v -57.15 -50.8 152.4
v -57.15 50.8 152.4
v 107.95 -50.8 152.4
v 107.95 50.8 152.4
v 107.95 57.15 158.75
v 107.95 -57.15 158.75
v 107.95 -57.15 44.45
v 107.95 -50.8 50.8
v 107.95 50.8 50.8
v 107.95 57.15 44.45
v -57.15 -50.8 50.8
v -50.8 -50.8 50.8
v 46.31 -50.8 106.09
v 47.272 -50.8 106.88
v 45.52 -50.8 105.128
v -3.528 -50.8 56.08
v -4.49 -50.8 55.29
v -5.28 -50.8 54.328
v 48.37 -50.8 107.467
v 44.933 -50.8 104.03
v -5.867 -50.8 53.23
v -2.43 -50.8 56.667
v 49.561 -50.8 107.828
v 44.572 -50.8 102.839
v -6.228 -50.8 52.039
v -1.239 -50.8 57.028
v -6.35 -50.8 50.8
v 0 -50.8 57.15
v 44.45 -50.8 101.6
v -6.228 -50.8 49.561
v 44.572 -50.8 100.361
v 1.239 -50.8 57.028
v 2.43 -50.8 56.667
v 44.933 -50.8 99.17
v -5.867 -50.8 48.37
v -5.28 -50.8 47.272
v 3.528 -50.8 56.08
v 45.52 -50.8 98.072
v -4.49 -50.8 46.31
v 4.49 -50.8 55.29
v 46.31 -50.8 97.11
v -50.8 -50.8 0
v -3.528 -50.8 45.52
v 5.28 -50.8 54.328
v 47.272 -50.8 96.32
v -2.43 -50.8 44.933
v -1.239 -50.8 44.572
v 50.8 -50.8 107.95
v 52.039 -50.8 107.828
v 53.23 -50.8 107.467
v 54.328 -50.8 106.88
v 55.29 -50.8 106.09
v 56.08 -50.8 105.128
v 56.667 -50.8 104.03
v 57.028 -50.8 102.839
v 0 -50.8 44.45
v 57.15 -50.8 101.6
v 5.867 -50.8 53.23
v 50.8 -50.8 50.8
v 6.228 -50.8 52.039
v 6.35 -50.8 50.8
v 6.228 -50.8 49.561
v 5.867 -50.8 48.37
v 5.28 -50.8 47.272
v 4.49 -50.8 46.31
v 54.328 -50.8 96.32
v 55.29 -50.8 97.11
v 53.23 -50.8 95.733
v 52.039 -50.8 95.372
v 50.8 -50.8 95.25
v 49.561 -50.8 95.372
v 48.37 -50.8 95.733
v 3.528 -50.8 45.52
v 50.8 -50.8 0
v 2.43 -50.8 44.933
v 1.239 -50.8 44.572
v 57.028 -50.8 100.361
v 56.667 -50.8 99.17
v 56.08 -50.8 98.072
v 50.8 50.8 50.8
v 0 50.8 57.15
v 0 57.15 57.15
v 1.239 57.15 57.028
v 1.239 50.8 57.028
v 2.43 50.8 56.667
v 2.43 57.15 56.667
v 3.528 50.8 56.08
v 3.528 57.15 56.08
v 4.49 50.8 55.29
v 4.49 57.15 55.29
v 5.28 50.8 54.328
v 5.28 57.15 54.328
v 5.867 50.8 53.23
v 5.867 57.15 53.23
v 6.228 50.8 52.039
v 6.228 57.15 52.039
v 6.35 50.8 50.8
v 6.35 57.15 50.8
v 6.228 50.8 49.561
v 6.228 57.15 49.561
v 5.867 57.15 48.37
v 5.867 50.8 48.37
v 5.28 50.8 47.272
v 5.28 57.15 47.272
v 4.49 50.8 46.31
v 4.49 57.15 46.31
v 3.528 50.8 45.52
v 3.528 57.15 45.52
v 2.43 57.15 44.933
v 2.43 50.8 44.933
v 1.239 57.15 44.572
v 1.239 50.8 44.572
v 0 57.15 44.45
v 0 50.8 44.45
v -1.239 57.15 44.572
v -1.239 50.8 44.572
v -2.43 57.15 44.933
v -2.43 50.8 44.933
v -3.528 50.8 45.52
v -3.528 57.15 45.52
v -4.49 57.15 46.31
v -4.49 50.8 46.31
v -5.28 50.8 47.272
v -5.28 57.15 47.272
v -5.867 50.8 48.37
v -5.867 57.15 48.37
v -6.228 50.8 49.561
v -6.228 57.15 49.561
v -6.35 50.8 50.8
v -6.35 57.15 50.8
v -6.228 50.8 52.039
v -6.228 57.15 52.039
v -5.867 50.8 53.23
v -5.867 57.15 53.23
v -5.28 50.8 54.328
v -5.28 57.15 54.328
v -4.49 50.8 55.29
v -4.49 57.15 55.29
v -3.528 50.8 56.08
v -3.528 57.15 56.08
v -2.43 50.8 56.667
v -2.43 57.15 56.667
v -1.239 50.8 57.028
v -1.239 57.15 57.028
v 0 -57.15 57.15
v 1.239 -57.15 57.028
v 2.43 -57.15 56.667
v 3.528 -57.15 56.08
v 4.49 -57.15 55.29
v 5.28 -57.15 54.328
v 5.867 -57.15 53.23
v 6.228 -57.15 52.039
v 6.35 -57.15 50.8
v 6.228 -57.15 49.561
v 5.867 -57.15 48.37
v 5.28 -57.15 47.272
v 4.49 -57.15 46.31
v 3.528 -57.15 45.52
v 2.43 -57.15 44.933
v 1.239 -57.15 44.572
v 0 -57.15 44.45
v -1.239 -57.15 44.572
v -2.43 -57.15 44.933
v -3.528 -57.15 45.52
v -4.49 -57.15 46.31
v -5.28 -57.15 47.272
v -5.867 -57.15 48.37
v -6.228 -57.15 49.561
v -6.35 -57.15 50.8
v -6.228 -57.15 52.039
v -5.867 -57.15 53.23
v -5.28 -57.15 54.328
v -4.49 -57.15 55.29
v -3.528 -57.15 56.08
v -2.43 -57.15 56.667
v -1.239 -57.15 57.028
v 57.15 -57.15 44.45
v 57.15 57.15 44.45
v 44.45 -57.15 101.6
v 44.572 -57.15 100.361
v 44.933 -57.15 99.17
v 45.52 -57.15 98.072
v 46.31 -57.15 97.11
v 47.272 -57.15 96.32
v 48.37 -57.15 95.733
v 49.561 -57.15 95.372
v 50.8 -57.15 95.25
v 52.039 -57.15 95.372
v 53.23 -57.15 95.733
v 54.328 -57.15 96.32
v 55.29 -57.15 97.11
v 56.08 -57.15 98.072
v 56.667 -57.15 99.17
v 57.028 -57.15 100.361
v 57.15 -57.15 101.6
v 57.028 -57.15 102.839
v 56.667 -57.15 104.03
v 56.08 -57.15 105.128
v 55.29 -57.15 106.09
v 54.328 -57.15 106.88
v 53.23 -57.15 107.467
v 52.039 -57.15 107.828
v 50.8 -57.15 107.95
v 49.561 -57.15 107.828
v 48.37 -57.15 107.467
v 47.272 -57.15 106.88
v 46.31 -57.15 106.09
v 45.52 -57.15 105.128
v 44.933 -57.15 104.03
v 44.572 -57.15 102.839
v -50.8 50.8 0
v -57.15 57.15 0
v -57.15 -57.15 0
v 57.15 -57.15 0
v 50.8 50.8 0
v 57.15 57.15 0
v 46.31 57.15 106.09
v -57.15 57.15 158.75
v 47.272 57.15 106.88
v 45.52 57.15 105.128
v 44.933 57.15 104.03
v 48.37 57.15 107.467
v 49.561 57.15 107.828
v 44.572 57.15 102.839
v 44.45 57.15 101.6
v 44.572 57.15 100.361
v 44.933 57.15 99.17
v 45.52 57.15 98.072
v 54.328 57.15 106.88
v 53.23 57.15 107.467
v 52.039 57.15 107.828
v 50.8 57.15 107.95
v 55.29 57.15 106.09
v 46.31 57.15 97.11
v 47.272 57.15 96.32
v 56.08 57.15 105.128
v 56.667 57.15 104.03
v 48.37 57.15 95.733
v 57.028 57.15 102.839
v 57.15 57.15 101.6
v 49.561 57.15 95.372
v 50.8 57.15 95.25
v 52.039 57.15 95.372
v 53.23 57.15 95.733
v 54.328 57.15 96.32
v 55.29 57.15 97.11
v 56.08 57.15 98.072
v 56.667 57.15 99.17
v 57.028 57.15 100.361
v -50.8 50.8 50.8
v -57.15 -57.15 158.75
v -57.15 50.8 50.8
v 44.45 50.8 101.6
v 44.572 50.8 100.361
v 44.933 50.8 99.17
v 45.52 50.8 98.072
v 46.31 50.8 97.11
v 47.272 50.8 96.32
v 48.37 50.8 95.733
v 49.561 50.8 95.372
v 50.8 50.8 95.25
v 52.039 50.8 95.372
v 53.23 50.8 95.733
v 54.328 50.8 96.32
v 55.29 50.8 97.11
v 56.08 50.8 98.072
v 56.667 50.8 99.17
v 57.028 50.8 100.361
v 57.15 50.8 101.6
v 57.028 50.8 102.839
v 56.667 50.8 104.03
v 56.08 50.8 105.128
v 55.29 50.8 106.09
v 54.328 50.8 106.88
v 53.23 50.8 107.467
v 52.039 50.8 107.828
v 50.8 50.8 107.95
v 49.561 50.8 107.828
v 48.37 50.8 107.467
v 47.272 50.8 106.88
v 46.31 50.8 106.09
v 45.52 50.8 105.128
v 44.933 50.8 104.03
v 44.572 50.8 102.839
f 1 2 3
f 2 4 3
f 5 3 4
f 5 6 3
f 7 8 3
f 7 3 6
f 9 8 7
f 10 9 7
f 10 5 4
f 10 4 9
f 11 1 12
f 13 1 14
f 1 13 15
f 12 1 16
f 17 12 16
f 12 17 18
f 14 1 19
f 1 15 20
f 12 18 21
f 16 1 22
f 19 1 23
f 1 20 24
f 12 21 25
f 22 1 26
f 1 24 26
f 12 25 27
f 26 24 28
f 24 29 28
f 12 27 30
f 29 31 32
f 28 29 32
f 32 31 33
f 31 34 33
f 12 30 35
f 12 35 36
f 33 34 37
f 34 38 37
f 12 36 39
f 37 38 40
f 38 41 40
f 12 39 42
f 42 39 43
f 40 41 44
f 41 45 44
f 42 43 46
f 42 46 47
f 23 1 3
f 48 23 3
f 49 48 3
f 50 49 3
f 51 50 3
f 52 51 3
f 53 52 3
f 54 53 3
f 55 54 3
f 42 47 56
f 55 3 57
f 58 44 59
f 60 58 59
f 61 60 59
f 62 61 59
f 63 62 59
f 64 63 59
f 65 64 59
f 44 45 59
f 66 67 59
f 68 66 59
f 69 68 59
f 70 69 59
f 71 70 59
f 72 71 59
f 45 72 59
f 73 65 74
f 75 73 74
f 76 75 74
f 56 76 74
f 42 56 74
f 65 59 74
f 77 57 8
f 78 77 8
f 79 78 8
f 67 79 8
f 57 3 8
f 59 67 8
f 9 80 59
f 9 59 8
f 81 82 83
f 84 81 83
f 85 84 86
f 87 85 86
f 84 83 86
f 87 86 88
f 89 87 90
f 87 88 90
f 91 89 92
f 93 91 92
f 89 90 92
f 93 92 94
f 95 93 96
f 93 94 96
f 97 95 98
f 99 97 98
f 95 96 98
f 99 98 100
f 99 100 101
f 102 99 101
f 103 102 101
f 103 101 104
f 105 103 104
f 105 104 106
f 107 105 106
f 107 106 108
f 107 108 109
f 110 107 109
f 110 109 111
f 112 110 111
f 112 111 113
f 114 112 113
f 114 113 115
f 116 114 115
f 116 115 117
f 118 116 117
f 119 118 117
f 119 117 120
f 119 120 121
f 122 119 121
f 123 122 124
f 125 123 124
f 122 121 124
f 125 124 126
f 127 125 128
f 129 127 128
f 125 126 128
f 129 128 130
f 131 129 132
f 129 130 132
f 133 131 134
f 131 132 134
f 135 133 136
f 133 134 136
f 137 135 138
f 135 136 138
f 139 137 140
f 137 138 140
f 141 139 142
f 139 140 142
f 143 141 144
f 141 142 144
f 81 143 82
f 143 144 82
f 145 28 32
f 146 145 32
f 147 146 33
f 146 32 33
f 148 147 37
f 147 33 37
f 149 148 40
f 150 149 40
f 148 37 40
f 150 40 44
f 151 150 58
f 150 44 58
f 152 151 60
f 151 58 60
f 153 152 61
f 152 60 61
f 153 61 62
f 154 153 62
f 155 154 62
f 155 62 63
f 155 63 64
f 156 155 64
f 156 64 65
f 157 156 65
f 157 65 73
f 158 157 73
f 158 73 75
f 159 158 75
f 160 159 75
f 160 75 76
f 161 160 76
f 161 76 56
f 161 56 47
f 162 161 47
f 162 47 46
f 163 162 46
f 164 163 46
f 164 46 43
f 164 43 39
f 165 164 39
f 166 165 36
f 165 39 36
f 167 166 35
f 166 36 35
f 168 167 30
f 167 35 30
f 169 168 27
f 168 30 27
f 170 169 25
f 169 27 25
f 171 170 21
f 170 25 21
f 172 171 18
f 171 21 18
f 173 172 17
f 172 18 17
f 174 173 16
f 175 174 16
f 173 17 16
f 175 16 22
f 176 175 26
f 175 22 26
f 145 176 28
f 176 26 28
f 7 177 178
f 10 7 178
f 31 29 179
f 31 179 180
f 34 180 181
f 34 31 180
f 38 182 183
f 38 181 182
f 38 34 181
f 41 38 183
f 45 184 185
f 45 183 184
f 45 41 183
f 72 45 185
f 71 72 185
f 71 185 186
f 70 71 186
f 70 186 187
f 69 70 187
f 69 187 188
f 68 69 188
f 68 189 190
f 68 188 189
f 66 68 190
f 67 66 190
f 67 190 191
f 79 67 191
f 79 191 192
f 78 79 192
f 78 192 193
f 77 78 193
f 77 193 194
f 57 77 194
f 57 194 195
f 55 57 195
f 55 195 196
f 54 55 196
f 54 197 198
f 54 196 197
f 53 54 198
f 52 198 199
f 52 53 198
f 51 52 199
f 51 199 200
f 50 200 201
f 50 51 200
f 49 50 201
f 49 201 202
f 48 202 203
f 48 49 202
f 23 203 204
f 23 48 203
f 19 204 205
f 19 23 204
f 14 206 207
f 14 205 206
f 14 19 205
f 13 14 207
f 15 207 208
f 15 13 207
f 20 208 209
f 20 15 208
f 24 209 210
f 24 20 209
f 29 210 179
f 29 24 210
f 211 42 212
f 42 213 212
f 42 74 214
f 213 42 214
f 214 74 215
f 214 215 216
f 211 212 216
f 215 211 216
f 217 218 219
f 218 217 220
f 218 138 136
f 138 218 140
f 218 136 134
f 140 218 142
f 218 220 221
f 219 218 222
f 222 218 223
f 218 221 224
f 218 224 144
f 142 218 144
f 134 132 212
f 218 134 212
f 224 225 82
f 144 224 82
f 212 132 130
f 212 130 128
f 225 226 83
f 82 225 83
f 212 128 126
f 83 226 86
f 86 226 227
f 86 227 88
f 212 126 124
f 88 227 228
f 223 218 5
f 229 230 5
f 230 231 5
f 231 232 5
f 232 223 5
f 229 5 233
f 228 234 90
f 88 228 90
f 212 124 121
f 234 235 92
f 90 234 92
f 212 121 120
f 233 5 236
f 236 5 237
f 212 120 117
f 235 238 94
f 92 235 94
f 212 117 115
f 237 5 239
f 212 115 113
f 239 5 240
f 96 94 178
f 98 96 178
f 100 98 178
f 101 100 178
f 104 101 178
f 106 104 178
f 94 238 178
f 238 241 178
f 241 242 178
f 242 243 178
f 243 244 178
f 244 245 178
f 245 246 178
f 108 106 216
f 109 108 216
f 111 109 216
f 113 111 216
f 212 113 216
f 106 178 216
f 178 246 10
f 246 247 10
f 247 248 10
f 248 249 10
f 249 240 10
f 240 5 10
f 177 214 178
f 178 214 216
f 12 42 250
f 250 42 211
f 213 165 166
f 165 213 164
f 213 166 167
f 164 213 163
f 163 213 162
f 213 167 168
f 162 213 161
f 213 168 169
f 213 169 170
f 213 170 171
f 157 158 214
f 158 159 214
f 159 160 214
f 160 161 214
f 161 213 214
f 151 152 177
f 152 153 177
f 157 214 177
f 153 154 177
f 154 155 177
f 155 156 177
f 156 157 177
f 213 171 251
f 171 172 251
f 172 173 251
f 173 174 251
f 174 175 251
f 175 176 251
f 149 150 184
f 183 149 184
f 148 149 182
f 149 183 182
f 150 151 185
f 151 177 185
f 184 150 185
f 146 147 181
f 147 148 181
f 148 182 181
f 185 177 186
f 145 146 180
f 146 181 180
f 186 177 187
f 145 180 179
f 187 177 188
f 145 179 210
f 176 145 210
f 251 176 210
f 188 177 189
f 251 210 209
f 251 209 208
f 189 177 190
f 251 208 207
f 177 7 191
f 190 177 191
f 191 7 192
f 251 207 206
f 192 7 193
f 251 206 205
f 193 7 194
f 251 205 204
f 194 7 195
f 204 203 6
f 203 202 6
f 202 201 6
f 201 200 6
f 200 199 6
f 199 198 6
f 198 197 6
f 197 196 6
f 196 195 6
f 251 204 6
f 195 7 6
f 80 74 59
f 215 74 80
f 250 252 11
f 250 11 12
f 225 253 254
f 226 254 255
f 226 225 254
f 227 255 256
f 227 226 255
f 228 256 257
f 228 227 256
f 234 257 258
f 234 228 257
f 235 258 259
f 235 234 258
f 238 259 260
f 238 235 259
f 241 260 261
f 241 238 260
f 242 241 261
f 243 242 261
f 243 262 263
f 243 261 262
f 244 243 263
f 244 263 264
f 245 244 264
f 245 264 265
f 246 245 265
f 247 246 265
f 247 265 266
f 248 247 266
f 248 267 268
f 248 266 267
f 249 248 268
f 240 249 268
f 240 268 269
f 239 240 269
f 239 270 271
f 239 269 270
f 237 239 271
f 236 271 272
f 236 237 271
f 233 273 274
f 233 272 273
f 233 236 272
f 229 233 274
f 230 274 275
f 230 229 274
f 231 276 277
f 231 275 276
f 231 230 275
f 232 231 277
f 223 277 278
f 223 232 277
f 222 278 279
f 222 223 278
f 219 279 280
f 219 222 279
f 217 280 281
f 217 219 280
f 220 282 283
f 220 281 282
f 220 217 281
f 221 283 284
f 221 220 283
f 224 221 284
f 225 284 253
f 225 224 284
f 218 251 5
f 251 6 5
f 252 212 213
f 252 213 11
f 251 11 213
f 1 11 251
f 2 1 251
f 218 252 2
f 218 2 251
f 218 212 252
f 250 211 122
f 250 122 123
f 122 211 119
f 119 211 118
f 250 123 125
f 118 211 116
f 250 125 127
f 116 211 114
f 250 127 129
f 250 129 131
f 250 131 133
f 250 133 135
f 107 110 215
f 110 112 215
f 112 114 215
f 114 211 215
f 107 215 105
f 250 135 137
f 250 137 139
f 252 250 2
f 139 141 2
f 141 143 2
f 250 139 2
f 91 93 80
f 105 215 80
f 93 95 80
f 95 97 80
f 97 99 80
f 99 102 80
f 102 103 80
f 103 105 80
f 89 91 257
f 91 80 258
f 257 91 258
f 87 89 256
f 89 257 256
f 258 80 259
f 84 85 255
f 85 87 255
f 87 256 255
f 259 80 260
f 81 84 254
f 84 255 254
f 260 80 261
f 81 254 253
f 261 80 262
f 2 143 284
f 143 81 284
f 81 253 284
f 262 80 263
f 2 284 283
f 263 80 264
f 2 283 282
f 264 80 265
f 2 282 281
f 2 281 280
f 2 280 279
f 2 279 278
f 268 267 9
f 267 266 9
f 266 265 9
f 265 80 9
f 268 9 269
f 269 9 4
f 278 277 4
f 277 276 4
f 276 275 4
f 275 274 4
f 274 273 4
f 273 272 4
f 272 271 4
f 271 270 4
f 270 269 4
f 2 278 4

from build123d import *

# Parameters (mm, degrees)
SKETCH1_W           = 114.3
SKETCH1_H           = 114.3
SKETCH1_W_2         = 101.6
SKETCH1_H_2         = 101.6
EXTRUDE_THIN1_DEPTH = 50.8
SKETCH3_W           = 114.3
SKETCH3_H           = 114.3
SKETCH3_W_2         = 101.6
SKETCH3_H_2         = 101.6
EXTRUDE_THIN2_DEPTH = 50.8
BOSS_EXTRUDE1_DEPTH = 114.3
SKETCH6_R           = 6.35
CUT_EXTRUDE1_DEPTH  = 224.426173489


with BuildPart() as part:
    # Sketch1 → Extrude-Thin1 (new body)
    with BuildSketch(Plane.XY):
        Rectangle(SKETCH1_W, SKETCH1_H)
        Rectangle(SKETCH1_W_2, SKETCH1_H_2, mode=Mode.SUBTRACT)
    extrude(amount=EXTRUDE_THIN1_DEPTH)

    # Sketch3 → Extrude-Thin2 (add)
    with BuildSketch(Plane(origin=(57.15, 0, 0), x_dir=(0, 0, -1), z_dir=(1, 0, 0))):
        with Locations((-101.6, 0)):
            Rectangle(SKETCH3_W, SKETCH3_H)
        with Locations((-101.6, 0)):
            Rectangle(SKETCH3_W_2, SKETCH3_H_2, mode=Mode.SUBTRACT)
    extrude(amount=EXTRUDE_THIN2_DEPTH)

    # Sketch4 → Boss-Extrude1 (add)
    with BuildSketch(Plane.ZY.offset(-57.15)):
        Polygon((50.8, -50.8), (50.8, -57.15), (158.75, -57.15), (158.75, 57.15), (50.8, 57.15), (50.8, 50.8), (152.4, 50.8), (152.4, -50.8), align=None)
    extrude(amount=BOSS_EXTRUDE1_DEPTH)

    # Sketch6 → Cut-Extrude1 (cut, through all)
    with BuildSketch(Plane(origin=(0, 57.15, 0), x_dir=(1, 0, 0), z_dir=(0, 1, 0))):
        with Locations(Location((0, -50.8, 0), (0, 0, 270))):
            Circle(SKETCH6_R)
    cut_extrude1 = extrude(amount=-CUT_EXTRUDE1_DEPTH, mode=Mode.SUBTRACT)

    # Mirror1: Cut-Extrude1 across plane
    add(cut_extrude1.mirror(Plane(origin=(50.8, 0, 50.8), x_dir=(-0.7071067811865477, 0, 0.7071067811865474), z_dir=(0.7071067811865476, 0, 0.7071067811865476))), mode=Mode.SUBTRACT)


solid = part.part
